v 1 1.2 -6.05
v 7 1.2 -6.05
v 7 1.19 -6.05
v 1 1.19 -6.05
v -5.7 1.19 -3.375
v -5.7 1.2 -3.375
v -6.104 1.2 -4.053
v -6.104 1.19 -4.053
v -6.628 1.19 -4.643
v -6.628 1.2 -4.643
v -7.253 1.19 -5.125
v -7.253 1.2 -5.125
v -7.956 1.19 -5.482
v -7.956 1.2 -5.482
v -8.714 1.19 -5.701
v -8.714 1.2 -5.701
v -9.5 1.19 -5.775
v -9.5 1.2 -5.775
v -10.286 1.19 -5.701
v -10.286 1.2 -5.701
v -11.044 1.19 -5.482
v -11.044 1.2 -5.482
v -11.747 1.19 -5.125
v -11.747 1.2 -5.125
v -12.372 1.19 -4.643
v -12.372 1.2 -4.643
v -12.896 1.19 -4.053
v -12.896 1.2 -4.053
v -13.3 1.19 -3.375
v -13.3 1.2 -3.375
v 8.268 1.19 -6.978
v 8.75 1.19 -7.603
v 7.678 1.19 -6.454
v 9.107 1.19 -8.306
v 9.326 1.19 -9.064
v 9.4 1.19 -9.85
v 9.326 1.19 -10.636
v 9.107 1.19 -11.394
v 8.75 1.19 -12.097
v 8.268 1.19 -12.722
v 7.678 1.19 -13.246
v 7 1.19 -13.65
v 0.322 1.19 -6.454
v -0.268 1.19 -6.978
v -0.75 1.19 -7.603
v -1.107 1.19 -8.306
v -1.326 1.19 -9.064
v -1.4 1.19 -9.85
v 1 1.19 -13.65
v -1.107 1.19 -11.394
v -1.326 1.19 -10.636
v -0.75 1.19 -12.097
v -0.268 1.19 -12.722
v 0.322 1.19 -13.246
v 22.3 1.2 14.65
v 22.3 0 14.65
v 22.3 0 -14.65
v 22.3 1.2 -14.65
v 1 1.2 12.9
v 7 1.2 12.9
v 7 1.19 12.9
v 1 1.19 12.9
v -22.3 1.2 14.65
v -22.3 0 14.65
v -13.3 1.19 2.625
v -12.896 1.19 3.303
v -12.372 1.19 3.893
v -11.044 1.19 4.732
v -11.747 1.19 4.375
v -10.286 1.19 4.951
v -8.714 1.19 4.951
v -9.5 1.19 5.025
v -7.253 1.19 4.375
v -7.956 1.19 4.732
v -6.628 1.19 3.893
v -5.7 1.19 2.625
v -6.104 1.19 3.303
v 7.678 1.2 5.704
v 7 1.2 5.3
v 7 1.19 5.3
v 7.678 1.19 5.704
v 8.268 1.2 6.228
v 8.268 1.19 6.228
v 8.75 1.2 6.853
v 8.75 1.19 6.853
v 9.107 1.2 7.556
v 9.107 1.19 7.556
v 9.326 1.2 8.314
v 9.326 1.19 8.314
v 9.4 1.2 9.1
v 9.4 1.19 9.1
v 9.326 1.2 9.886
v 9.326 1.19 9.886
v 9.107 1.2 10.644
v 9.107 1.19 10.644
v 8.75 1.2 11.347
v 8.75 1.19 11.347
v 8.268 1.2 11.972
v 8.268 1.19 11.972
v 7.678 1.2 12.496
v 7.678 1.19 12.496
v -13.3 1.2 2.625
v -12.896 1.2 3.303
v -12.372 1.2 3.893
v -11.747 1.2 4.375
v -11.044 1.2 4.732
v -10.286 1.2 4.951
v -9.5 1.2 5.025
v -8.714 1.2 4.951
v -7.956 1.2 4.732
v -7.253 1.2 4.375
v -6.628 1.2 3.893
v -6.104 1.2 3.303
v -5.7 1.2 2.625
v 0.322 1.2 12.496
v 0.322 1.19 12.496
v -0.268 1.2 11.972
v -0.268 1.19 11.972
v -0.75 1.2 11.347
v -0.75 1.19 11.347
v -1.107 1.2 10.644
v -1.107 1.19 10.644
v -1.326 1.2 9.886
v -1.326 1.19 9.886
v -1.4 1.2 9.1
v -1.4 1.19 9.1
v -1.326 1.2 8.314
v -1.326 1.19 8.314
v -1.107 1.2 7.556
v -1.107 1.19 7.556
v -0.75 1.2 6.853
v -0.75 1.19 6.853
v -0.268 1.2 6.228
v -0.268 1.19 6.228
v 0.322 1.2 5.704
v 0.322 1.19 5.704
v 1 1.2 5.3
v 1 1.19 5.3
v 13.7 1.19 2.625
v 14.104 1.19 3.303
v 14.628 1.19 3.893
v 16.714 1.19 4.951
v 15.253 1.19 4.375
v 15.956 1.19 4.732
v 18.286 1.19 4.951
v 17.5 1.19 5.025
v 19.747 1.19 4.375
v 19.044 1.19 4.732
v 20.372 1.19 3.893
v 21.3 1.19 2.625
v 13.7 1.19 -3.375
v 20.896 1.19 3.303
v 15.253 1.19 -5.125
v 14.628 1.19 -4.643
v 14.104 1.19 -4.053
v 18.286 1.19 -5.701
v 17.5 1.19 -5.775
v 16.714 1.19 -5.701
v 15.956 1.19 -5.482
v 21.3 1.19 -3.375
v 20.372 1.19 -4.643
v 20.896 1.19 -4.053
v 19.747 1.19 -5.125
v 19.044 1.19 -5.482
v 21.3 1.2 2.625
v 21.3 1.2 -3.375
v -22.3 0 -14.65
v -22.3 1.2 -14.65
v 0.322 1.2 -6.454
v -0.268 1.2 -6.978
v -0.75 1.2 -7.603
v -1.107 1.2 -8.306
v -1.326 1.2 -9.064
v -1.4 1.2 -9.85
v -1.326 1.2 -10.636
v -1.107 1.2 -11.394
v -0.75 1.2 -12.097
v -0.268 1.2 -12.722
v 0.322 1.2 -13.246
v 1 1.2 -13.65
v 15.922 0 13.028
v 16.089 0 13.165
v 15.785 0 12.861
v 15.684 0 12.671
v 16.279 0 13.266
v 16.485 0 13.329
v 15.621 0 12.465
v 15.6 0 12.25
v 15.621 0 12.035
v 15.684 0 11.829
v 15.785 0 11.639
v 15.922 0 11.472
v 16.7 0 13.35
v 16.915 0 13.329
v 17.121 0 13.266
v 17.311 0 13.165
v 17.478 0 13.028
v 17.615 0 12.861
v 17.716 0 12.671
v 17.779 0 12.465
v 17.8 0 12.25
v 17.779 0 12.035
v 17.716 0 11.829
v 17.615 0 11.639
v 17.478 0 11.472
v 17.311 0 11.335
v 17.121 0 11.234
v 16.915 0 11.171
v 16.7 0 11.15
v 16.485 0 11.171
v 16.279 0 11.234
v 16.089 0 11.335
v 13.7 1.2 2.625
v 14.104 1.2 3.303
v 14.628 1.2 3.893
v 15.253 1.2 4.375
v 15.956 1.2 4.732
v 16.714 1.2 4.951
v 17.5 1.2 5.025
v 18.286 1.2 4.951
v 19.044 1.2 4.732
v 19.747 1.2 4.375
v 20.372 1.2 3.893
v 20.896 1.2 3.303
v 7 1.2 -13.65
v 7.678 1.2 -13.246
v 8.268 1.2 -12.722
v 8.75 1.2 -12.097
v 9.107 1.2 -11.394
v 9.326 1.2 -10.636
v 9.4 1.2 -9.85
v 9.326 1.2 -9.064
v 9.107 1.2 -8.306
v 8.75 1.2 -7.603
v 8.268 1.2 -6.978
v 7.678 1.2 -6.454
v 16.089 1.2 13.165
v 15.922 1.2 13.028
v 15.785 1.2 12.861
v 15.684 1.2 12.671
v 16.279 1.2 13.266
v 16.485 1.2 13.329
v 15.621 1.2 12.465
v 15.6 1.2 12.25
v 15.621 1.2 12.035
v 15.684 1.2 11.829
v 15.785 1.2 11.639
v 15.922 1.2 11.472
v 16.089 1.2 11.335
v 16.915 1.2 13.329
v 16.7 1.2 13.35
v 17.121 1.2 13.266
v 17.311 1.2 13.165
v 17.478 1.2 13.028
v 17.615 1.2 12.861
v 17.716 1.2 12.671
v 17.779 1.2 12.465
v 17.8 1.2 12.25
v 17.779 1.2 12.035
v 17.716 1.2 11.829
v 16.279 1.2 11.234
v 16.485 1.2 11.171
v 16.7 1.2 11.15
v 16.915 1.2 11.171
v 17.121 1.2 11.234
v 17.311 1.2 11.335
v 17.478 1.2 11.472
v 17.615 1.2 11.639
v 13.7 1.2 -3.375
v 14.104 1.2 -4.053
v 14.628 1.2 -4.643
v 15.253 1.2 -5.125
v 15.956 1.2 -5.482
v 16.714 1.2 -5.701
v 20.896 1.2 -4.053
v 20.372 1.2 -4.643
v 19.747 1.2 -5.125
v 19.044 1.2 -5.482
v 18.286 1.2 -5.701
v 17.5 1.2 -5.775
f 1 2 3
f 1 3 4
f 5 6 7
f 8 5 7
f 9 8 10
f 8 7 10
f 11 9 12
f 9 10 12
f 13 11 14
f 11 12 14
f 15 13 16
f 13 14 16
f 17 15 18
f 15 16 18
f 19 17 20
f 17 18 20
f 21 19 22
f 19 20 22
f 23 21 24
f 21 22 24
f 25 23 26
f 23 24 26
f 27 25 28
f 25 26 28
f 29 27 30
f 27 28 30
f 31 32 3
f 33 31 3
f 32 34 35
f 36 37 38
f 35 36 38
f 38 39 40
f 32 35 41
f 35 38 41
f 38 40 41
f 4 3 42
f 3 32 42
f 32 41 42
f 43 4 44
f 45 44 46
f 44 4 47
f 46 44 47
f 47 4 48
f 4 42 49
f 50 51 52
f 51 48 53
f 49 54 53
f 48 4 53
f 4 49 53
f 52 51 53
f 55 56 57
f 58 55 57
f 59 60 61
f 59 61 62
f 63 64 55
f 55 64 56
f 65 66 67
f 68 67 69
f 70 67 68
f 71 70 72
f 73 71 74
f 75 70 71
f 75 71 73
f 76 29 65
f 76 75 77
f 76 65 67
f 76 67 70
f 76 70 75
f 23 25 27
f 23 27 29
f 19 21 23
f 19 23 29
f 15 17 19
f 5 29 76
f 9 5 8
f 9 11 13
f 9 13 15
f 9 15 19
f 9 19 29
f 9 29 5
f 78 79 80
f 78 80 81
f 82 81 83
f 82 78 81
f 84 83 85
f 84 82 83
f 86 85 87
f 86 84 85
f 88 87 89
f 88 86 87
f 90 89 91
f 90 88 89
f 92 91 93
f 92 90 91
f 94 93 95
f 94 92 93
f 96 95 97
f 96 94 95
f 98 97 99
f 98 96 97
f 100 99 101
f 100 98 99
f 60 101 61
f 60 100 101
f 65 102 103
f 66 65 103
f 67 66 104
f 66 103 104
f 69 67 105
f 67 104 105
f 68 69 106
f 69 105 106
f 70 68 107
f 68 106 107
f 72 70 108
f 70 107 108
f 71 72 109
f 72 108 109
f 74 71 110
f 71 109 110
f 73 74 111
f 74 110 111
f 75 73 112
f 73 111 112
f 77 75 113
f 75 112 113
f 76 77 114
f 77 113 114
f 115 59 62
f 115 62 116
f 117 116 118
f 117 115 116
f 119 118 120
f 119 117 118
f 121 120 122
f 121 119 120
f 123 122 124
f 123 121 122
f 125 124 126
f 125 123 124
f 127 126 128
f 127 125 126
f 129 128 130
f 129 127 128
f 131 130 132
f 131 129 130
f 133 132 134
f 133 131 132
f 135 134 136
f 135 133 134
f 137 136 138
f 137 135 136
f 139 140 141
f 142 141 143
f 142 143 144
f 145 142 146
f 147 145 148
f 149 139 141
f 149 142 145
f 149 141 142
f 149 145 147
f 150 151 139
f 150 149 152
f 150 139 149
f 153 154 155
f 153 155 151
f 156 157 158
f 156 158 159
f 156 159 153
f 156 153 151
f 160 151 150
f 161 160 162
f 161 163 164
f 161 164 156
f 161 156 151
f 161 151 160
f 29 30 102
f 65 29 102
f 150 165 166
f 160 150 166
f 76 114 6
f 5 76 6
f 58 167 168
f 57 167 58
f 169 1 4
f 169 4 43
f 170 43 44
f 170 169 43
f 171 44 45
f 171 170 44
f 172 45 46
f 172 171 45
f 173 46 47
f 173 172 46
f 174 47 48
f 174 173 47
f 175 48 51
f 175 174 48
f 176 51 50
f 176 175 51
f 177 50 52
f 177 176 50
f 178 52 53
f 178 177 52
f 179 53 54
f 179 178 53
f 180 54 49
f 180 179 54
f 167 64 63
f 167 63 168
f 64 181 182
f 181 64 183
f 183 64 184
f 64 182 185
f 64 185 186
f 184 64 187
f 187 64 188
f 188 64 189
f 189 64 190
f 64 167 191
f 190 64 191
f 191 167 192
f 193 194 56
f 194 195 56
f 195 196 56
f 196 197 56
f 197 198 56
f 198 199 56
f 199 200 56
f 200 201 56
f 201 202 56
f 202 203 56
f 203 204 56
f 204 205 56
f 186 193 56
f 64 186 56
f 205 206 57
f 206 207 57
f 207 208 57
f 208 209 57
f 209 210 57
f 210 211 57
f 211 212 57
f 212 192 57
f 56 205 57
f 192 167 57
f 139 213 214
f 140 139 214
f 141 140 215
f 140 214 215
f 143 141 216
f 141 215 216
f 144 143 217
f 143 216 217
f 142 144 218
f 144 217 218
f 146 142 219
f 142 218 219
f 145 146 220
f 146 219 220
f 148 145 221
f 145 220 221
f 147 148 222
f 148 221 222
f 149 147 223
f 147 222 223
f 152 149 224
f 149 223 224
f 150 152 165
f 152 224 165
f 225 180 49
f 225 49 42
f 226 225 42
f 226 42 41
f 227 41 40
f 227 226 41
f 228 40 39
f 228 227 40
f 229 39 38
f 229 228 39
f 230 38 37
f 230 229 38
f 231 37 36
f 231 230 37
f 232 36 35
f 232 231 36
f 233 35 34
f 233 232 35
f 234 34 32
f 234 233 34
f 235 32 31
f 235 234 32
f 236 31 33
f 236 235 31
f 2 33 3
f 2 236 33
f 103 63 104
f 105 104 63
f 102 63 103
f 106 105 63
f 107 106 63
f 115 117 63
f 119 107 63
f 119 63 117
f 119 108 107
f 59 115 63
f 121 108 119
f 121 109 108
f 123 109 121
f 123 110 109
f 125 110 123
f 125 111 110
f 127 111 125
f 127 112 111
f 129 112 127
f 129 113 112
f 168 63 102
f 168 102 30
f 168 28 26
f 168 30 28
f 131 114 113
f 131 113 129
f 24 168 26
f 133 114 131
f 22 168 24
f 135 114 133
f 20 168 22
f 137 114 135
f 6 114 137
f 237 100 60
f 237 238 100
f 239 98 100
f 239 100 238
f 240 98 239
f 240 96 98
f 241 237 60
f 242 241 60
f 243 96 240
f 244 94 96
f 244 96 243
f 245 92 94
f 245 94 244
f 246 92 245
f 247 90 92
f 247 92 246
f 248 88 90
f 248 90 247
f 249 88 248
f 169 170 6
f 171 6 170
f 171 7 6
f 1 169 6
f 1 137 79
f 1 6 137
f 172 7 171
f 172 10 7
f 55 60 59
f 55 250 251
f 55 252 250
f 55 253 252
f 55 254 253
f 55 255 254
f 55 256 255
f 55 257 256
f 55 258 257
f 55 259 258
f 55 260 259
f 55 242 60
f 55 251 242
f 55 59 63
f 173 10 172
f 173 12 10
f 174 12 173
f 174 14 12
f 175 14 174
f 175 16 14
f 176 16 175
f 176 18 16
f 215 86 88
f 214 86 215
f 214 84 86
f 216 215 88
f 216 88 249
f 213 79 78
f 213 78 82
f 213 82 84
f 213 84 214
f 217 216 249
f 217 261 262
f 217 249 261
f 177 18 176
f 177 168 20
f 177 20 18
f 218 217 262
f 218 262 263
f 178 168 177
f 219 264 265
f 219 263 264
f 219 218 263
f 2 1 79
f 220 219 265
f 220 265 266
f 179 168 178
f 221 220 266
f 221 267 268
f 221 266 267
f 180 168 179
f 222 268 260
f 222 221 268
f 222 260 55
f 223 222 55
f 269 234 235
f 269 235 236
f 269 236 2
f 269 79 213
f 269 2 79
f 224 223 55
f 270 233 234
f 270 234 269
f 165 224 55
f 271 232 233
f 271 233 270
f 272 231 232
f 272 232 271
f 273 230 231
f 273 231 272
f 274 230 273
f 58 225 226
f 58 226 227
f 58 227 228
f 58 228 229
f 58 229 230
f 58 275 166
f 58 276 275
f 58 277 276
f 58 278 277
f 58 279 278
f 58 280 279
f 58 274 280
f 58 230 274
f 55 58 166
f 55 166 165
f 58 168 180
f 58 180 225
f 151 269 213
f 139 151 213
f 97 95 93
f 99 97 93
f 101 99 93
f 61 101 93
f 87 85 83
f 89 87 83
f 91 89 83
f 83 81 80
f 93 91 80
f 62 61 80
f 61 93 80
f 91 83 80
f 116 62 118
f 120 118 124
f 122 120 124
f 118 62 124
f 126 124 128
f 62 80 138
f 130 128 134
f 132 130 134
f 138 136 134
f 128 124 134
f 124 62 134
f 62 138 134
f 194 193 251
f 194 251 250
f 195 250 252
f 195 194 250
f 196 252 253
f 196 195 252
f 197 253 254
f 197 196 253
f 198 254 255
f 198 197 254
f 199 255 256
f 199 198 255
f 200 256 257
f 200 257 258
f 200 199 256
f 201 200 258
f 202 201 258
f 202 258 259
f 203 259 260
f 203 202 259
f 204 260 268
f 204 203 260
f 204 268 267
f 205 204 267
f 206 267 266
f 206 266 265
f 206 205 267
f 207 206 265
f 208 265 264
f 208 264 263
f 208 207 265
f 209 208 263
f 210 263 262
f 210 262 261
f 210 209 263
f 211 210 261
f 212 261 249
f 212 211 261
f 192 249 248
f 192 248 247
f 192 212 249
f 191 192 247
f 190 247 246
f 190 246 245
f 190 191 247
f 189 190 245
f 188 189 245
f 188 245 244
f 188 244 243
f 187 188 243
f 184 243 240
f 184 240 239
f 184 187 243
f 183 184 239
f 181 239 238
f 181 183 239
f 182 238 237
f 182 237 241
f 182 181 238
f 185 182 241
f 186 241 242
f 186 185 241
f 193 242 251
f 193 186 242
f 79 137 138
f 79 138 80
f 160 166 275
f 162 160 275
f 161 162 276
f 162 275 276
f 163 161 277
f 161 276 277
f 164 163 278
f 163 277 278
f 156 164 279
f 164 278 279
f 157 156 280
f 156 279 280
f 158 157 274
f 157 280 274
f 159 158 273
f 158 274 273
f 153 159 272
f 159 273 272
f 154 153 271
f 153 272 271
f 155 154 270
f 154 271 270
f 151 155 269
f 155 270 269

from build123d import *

# Parameters (mm, degrees)
ESQUISSE1_W             = 44.6
ESQUISSE1_H             = 29.3
ESQUISSE1_R             = 1.1
BOSS_EXTRU_2_DEPTH      = 1.2
ENL_V_MAT_EXTRU_1_DEPTH = 0.01


with BuildPart() as part:
    # Esquisse1 → Boss.-Extru.2 (new body)
    with BuildSketch(Plane(origin=(0, 0, 0), x_dir=(1, 0, 0), z_dir=(0, 1, 0))):
        Rectangle(ESQUISSE1_W, ESQUISSE1_H)
        with Locations(Location((16.7, -12.25, 0), (0, 0, 270))):
            Circle(ESQUISSE1_R, mode=Mode.SUBTRACT)
    extrude(amount=BOSS_EXTRU_2_DEPTH)

    # Esquisse7 → Enlèv. mat.-Extru.1 (cut)
    with BuildSketch(Plane(origin=(0, 1.2, 0), x_dir=(1, 0, 0), z_dir=(0, 1, 0))):
        with BuildLine():
            Line((1, 13.65), (7, 13.65))
            ThreePointArc((7, 13.65), (9.4, 9.85), (7, 6.05))
            Line((7, 6.05), (1, 6.05))
            ThreePointArc((1, 6.05), (-1.4, 9.85), (1, 13.65))
        make_face()
        with BuildLine():
            Line((1, -5.3), (7, -5.3))
            ThreePointArc((7, -5.3), (9.4, -9.1), (7, -12.9))
            Line((7, -12.9), (1, -12.9))
            ThreePointArc((1, -12.9), (-1.4, -9.1), (1, -5.3))
        make_face()
        with BuildLine():
            Line((-13.3, 3.375), (-13.3, -2.625))
            ThreePointArc((-13.3, -2.625), (-9.5, -5.025), (-5.7, -2.625))
            Line((-5.7, -2.625), (-5.7, 3.375))
            ThreePointArc((-5.7, 3.375), (-9.5, 5.775), (-13.3, 3.375))
        make_face()
        with BuildLine():
            Line((13.7, 3.375), (13.7, -2.625))
            ThreePointArc((13.7, -2.625), (17.5, -5.025), (21.3, -2.625))
            Line((21.3, -2.625), (21.3, 3.375))
            ThreePointArc((21.3, 3.375), (17.5, 5.775), (13.7, 3.375))
        make_face()
    extrude(amount=-ENL_V_MAT_EXTRU_1_DEPTH, mode=Mode.SUBTRACT)


solid = part.part
